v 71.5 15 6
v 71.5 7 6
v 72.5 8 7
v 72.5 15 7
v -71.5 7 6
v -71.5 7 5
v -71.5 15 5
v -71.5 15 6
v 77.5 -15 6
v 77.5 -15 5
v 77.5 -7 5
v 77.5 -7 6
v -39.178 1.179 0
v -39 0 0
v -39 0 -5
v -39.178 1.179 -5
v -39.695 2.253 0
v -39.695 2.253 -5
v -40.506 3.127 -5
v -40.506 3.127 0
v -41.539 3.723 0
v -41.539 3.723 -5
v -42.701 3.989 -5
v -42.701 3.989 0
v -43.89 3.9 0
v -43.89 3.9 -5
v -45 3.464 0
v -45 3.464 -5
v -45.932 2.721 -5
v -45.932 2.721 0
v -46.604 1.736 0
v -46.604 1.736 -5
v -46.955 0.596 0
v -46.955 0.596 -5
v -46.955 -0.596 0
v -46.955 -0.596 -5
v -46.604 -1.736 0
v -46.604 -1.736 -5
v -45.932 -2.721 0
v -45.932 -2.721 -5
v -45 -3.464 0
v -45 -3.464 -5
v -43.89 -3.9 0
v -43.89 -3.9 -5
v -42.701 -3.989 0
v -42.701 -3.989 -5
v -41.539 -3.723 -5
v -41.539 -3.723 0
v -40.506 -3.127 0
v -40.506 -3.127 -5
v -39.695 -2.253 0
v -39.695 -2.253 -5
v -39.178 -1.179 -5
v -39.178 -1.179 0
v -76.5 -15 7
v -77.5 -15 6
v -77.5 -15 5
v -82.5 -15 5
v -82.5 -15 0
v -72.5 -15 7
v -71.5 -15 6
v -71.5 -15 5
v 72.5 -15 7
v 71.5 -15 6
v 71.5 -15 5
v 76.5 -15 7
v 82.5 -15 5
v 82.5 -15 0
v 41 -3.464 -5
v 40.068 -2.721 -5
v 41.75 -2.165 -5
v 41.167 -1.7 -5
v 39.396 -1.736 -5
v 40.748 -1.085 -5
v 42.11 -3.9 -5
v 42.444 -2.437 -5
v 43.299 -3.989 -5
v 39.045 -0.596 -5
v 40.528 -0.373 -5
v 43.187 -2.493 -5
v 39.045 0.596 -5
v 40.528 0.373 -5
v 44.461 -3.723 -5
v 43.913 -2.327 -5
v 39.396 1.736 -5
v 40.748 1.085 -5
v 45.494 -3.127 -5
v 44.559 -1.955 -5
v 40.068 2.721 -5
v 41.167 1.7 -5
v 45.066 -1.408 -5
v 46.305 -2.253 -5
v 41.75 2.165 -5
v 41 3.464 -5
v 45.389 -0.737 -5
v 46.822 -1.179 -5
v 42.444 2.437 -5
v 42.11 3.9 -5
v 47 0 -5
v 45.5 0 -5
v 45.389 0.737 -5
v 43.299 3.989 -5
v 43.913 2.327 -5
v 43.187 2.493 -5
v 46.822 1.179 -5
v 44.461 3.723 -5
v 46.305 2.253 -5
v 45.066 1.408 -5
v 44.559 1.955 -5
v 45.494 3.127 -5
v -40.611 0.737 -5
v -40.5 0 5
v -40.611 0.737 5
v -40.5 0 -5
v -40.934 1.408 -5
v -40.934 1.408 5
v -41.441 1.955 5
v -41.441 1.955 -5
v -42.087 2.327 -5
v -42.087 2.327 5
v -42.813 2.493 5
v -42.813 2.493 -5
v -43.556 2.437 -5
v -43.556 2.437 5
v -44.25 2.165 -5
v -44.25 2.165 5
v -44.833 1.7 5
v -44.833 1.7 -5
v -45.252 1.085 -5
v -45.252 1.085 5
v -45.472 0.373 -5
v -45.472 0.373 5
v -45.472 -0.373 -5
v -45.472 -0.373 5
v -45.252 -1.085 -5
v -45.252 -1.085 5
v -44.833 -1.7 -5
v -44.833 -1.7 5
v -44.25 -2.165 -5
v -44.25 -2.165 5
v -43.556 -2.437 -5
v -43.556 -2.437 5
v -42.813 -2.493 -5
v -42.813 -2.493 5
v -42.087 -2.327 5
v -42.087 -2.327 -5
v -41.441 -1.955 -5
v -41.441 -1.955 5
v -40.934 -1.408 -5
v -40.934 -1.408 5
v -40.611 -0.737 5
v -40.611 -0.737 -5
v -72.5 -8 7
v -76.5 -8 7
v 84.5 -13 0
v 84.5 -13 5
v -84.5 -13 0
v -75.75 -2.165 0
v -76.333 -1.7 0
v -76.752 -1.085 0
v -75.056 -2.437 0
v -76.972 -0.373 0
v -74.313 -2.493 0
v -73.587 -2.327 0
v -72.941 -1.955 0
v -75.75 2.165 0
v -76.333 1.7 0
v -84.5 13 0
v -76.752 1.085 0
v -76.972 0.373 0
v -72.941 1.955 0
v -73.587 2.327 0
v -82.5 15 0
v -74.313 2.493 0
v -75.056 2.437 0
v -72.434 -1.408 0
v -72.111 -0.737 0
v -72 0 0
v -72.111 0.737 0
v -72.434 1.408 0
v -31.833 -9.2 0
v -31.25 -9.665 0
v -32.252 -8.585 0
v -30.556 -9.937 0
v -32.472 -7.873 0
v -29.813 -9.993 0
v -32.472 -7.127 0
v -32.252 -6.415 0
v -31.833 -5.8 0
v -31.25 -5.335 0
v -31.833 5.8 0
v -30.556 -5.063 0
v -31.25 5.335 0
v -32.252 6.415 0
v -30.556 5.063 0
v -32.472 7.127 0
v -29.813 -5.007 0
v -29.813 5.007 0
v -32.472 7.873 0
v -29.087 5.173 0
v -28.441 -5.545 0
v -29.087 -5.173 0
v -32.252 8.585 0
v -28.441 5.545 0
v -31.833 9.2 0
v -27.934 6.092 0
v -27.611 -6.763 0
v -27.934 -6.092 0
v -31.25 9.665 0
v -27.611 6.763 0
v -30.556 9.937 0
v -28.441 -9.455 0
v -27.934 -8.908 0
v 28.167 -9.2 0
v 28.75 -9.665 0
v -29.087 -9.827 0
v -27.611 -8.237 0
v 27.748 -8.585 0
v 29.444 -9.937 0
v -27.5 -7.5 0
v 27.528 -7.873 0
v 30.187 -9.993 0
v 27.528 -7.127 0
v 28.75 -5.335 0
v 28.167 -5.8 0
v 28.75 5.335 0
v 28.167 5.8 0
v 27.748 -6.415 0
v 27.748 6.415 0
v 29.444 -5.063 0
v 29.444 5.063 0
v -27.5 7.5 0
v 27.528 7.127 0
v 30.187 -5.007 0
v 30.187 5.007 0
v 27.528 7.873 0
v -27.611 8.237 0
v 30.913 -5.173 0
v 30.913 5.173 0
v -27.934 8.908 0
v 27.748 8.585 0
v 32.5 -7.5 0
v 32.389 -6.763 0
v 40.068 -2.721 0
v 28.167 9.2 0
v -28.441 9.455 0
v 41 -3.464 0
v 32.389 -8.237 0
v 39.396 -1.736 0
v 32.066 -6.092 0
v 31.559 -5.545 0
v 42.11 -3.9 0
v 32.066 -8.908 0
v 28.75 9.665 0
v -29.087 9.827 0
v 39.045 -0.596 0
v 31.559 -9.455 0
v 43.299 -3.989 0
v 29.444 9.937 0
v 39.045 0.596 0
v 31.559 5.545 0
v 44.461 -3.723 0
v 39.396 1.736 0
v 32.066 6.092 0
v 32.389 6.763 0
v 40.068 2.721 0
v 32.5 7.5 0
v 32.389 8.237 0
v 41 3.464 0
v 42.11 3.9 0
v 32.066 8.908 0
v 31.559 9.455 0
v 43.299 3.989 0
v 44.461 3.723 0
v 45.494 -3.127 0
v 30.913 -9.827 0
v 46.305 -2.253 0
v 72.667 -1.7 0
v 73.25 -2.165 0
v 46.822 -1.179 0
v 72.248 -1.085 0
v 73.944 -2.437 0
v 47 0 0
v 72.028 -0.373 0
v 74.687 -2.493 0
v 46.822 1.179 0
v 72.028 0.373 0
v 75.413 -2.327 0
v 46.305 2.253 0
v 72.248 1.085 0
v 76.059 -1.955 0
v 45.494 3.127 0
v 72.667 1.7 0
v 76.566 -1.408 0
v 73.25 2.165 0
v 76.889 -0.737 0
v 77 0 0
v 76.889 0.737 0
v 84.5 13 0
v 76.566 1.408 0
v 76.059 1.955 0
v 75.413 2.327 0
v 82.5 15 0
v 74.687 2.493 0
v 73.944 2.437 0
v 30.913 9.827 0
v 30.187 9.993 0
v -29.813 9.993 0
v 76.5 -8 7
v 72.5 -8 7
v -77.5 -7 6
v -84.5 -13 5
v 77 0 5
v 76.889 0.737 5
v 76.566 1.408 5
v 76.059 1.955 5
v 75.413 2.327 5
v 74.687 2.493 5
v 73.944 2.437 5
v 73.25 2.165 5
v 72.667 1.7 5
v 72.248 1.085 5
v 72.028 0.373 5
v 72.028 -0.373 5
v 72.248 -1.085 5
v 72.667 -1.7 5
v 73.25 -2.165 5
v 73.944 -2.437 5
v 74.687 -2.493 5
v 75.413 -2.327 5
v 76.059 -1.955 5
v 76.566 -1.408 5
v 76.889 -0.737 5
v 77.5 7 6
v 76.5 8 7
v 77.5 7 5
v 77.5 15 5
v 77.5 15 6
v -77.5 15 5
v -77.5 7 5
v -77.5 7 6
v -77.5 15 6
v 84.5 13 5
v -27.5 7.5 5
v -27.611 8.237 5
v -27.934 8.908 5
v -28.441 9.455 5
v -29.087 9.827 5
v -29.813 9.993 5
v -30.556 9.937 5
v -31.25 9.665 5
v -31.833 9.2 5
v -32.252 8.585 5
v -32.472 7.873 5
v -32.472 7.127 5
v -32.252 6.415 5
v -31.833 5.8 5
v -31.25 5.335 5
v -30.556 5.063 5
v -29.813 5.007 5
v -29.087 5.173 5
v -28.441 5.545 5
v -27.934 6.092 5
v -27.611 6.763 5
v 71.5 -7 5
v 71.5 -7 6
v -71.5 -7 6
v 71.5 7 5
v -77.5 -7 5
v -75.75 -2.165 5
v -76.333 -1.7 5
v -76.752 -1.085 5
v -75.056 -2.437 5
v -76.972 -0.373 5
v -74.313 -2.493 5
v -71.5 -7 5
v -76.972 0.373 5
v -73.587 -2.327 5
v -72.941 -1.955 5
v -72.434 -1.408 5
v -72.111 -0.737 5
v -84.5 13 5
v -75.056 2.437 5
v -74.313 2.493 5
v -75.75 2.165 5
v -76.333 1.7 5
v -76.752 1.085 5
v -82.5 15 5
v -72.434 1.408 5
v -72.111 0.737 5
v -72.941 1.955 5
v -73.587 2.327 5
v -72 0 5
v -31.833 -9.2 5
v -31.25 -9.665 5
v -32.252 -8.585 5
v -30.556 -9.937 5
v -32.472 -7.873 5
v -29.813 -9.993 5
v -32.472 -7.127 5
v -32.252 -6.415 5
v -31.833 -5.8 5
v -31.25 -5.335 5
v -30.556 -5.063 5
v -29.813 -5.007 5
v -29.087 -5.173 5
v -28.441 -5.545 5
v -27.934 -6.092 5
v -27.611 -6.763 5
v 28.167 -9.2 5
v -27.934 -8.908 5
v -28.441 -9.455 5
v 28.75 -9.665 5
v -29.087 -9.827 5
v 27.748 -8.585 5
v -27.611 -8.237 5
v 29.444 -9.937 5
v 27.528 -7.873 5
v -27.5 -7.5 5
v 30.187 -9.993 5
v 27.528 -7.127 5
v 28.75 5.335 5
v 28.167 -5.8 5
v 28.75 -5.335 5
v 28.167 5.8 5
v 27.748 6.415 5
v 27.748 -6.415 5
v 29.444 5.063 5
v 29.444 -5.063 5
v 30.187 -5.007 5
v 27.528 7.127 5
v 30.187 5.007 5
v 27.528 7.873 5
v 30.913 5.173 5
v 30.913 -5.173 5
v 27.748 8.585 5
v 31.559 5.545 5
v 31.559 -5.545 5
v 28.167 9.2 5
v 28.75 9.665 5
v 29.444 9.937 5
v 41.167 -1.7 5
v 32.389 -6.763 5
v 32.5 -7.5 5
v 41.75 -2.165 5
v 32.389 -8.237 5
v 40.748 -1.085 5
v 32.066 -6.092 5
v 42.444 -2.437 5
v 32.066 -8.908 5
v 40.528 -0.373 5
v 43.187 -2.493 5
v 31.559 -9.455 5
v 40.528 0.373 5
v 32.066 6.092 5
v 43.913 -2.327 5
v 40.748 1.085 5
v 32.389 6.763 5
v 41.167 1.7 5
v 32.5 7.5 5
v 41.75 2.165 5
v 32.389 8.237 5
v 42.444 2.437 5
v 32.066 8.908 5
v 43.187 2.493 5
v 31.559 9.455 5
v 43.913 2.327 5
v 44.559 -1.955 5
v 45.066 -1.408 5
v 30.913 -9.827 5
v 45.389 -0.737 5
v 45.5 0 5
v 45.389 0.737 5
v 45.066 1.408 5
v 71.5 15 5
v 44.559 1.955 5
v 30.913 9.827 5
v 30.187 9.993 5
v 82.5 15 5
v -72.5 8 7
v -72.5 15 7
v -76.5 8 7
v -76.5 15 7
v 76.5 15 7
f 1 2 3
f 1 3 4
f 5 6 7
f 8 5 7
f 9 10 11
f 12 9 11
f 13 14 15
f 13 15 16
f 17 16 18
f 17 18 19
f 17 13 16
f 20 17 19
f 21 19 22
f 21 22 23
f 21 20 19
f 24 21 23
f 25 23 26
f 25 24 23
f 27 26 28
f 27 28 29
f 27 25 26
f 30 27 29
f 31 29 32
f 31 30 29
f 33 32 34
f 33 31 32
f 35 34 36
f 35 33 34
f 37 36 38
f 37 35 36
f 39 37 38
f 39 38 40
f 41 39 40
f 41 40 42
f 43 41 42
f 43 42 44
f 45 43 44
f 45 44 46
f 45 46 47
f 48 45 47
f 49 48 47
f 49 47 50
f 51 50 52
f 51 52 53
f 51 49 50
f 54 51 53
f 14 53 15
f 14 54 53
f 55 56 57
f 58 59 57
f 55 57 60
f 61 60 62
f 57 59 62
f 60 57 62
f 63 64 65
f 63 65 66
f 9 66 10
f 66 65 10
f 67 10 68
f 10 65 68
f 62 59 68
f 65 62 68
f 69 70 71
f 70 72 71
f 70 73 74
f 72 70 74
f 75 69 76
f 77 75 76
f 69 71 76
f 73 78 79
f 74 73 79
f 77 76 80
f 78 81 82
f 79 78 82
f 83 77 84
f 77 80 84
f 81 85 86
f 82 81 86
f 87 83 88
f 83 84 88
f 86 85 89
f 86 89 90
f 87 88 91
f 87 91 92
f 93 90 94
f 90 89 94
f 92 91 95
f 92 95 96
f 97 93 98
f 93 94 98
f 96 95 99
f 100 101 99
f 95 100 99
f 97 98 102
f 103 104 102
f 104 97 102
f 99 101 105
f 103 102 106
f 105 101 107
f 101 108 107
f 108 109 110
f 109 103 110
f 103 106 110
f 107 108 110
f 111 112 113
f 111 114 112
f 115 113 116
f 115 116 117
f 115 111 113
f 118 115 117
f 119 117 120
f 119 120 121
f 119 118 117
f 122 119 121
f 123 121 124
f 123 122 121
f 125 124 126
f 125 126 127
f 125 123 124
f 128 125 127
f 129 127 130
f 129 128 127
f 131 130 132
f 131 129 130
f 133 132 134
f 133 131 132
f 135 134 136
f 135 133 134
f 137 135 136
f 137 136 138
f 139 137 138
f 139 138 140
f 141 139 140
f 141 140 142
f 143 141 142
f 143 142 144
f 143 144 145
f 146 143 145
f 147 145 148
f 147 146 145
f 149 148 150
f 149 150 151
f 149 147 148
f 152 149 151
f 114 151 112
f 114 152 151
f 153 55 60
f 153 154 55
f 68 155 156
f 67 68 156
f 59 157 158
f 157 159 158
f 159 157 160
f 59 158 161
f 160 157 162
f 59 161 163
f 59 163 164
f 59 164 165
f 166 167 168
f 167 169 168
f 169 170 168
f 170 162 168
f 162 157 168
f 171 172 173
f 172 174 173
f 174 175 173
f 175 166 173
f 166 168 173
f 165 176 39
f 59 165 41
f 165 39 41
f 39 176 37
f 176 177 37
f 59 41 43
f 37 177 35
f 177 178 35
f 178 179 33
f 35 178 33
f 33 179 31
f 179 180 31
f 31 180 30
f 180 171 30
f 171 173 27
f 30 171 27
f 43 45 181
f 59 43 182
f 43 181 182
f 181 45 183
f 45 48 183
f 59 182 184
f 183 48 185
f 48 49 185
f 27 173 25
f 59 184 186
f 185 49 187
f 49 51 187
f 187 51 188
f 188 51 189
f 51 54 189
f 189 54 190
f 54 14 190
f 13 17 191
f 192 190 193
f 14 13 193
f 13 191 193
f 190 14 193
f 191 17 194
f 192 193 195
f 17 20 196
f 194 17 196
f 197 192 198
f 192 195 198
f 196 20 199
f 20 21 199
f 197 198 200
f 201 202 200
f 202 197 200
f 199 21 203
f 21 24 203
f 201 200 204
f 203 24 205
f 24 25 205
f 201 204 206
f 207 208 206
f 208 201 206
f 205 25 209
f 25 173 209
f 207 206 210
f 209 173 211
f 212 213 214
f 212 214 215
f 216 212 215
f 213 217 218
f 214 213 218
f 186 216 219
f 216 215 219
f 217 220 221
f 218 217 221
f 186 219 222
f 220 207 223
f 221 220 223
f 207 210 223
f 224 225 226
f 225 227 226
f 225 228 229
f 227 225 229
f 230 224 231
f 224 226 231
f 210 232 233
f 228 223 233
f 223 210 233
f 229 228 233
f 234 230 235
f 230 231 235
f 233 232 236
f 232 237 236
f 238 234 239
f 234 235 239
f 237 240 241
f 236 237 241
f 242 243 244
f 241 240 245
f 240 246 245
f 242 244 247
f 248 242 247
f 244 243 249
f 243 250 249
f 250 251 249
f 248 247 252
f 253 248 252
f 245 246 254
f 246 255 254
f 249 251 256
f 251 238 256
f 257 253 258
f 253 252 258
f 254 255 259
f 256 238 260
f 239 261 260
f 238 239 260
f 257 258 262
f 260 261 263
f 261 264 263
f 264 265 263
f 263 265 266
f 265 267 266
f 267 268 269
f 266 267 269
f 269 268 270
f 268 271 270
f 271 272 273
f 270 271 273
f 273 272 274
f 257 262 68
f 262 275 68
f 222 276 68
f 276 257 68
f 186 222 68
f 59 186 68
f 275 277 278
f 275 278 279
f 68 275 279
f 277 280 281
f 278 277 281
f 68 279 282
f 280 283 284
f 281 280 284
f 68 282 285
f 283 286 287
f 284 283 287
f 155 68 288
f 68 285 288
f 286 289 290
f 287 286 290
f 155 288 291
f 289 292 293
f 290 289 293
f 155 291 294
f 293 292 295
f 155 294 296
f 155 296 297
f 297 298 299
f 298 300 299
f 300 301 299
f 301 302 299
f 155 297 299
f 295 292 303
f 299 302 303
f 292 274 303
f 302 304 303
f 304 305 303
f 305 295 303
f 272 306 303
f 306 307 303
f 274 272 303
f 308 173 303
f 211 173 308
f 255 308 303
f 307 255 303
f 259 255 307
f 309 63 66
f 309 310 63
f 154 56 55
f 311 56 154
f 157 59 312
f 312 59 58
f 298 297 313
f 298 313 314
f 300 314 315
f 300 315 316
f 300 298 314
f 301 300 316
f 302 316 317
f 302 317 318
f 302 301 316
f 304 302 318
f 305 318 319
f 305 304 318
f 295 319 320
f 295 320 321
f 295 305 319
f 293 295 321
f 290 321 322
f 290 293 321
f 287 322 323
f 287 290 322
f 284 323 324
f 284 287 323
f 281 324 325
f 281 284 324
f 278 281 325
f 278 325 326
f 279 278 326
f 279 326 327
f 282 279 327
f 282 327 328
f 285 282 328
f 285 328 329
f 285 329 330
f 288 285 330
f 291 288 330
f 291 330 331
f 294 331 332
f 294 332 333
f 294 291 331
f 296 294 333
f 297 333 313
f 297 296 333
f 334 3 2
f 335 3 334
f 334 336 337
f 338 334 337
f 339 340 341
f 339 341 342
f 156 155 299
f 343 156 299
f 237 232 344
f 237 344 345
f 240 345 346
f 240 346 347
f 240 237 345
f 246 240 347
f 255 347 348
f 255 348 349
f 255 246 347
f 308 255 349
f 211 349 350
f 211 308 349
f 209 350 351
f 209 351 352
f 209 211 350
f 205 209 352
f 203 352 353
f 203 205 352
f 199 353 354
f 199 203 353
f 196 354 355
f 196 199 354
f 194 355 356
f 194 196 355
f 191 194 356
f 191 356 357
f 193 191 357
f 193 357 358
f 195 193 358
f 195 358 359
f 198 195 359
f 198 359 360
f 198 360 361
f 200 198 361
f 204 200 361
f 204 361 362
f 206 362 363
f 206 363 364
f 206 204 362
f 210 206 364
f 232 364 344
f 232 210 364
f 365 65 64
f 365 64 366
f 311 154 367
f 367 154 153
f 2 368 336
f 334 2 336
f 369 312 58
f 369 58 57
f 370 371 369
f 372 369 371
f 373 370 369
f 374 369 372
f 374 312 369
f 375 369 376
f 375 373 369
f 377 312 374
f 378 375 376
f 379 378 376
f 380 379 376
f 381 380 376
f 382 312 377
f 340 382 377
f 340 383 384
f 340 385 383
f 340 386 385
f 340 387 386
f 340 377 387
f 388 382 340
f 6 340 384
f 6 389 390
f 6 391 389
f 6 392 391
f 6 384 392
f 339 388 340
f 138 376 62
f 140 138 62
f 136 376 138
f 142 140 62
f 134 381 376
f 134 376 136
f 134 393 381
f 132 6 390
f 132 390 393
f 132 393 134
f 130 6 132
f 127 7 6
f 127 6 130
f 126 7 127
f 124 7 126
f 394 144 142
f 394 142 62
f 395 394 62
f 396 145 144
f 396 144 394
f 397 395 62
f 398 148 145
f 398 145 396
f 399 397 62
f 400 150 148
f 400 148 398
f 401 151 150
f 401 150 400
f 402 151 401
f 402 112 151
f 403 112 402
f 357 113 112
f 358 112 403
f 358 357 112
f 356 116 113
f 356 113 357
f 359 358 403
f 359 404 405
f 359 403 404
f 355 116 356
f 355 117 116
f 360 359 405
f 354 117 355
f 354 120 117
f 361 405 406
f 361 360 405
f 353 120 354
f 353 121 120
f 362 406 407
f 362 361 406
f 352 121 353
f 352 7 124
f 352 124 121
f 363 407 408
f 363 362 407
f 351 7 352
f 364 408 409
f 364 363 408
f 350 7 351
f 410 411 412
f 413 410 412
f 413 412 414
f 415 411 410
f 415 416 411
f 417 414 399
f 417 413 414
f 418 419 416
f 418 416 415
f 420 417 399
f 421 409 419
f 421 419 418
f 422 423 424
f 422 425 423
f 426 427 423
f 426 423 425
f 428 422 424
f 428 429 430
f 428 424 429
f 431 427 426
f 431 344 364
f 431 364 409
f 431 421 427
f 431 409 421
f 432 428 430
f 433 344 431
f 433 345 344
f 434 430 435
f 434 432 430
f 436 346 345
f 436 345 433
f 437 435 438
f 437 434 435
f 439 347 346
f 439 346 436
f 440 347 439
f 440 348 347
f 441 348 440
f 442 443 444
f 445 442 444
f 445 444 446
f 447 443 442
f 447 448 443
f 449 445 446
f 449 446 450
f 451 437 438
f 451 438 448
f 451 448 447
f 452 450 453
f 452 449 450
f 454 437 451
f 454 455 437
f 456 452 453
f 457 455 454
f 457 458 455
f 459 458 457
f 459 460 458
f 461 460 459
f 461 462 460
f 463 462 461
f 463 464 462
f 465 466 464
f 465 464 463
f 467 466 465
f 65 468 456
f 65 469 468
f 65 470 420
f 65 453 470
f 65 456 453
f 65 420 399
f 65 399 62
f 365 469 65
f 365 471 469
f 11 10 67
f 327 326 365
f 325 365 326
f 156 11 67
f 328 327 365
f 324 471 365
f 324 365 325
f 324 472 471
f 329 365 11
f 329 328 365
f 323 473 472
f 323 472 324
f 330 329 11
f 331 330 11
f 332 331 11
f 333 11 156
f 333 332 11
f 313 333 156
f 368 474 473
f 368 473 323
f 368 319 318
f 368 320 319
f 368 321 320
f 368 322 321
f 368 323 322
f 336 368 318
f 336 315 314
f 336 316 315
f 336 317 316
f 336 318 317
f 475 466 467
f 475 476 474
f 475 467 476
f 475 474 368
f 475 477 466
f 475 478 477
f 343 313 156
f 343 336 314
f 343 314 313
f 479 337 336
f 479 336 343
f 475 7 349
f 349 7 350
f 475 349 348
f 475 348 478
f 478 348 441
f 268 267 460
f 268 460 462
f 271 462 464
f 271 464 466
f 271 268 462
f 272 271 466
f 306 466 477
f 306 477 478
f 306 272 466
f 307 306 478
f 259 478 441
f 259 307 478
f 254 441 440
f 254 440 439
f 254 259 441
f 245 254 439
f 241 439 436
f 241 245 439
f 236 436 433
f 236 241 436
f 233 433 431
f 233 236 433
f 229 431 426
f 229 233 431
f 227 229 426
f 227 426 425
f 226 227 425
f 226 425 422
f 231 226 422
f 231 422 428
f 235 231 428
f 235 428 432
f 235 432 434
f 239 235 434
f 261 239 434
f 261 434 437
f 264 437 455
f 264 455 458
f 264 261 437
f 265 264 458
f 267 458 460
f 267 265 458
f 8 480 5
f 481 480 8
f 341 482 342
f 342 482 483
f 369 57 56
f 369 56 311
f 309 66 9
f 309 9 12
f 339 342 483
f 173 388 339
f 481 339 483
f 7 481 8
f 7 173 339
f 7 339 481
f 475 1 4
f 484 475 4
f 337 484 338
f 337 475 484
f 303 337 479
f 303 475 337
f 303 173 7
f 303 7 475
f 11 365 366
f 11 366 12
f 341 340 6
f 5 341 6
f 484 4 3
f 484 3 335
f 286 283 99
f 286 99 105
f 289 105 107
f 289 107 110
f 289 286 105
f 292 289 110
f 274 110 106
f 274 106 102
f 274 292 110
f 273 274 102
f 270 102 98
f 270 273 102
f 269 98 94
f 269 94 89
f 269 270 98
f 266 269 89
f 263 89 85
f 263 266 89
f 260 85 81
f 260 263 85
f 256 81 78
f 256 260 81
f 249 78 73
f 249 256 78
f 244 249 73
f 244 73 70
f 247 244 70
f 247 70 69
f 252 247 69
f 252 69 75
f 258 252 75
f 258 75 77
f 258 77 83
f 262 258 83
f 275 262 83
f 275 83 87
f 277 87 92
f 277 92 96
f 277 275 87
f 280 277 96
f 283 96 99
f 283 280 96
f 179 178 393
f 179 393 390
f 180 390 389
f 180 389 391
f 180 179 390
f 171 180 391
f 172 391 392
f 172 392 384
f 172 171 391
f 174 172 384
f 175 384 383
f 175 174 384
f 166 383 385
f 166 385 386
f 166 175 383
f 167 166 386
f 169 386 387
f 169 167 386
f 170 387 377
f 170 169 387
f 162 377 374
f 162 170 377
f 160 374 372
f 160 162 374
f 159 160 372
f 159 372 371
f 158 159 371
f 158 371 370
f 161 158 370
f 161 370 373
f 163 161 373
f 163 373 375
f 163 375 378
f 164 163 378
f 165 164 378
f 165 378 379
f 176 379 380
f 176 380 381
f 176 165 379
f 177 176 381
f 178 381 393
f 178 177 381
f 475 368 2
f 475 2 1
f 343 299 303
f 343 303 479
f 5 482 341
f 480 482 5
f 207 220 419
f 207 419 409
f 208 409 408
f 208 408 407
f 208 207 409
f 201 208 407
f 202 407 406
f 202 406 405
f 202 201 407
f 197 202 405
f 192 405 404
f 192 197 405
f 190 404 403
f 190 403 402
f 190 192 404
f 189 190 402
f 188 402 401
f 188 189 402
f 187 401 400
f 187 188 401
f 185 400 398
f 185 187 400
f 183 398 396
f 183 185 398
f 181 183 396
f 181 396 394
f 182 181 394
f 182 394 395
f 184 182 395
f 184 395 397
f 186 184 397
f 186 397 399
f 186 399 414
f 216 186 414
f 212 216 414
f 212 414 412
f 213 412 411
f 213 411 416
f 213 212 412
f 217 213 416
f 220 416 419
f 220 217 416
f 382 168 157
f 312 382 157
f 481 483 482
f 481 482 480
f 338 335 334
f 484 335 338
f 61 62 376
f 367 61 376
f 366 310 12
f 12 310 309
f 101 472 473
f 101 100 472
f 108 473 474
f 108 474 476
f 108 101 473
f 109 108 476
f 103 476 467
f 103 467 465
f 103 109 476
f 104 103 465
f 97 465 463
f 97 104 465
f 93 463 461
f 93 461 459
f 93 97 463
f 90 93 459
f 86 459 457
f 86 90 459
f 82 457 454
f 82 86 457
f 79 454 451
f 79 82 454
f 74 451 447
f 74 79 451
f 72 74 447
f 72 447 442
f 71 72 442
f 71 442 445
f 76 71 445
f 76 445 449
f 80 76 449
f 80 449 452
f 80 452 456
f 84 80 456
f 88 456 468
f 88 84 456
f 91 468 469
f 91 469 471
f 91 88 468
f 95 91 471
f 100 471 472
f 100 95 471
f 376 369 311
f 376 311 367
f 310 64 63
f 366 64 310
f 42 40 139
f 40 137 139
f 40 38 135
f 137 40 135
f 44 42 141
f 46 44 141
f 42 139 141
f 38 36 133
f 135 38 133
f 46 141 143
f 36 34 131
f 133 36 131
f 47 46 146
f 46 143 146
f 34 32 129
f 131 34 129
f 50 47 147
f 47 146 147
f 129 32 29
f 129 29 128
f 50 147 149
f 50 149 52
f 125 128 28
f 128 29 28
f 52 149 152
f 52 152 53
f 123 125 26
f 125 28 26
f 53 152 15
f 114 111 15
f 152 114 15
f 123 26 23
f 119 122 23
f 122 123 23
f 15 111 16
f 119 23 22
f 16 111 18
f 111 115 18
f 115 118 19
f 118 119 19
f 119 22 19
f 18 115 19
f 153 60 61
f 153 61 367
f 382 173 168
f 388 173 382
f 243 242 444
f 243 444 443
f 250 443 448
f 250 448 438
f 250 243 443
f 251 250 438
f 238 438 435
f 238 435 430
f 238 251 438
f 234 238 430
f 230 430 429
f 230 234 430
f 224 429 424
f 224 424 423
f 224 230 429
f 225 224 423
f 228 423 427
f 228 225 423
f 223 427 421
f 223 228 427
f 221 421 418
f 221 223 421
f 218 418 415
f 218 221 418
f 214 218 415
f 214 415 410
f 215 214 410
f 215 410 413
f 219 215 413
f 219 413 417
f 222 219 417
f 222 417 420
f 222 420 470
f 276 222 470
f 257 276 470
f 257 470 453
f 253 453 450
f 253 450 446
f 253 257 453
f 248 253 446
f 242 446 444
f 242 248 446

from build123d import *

# Parameters (mm, degrees)
F0_R     = 2.5
F0_R_2   = 4
F1_DEPTH = 5
F0_W     = 6
F0_H     = 8
F2_DEPTH = 7
F3_SIZE  = 1
F4_DEPTH = 5
F5_SIZE  = 2


with BuildPart() as f1:
    # F0 (on Top) → F1 (new body)
    with BuildSketch(Plane.XY):
        Polygon((-77.5, 15), (-84.5, 15), (-84.5, -15), (-77.5, -15), (-77.5, -7), (-71.5, -7), (-71.5, -15), (71.5, -15), (71.5, -7), (77.5, -7), (77.5, -15), (84.5, -15), (84.5, 15), (77.5, 15), (77.5, 7), (71.5, 7), (71.5, 15), (-71.5, 15), (-71.5, 7), (-77.5, 7), align=None)
        with Locations((-30, -7.5)):
            Circle(F0_R, mode=Mode.SUBTRACT)
        with Locations((30, -7.5)):
            Circle(F0_R, mode=Mode.SUBTRACT)
        with Locations((-74.5, 0)):
            Circle(F0_R, mode=Mode.SUBTRACT)
        with Locations((-43, 0)):
            Circle(F0_R_2, mode=Mode.SUBTRACT)
        with Locations((-30, 7.5)):
            Circle(F0_R, mode=Mode.SUBTRACT)
        with Locations((43, 0)):
            Circle(F0_R_2, mode=Mode.SUBTRACT)
        with Locations((74.5, 0)):
            Circle(F0_R, mode=Mode.SUBTRACT)
        with Locations((30, 7.5)):
            Circle(F0_R, mode=Mode.SUBTRACT)
        with Locations((-43, 0)):
            Circle(F0_R_2)
        with Locations((-43, 0)):
            Circle(F0_R, mode=Mode.SUBTRACT)
        with Locations((43, 0)):
            Circle(F0_R_2)
        with Locations((43, 0)):
            Circle(F0_R, mode=Mode.SUBTRACT)
    extrude(amount=F1_DEPTH)

    # F0 (on Top) → F2 (join)
    with BuildSketch(Plane.XY):
        with Locations((-74.5, 11)):
            Rectangle(F0_W, F0_H)
        with Locations((-74.5, -11)):
            Rectangle(F0_W, F0_H)
        with Locations((74.5, -11)):
            Rectangle(F0_W, F0_H)
        with Locations((74.5, 11)):
            Rectangle(F0_W, F0_H)
    extrude(amount=F2_DEPTH)

    # F3
    f3_edges = [f1.edges().sort_by_distance(p)[0] for p in [
        (-77.5, 11, 7),
        (-71.5, 11, 7),
        (-74.5, 7, 7),
        (-74.5, -7, 7),
        (-71.5, -11, 7),
        (-77.5, -11, 7),
        (77.5, 11, 7),
        (74.5, 7, 7),
        (71.5, 11, 7),
        (74.5, -7, 7),
        (77.5, -11, 7),
        (71.5, -11, 7),
    ]]
    chamfer(f3_edges, length=F3_SIZE)

    # F0 (on Top) → F4 (join)
    with BuildSketch(Plane.XY):
        with Locations((43, 0)):
            Circle(F0_R_2)
        with Locations((43, 0)):
            Circle(F0_R, mode=Mode.SUBTRACT)
        with Locations((-43, 0)):
            Circle(F0_R_2)
        with Locations((-43, 0)):
            Circle(F0_R, mode=Mode.SUBTRACT)
    extrude(amount=-F4_DEPTH)

    # F5
    f5_edges = [f1.edges().sort_by_distance(p)[0] for p in [
        (-84.5, -15, 2.5),
        (-84.5, 15, 2.5),
        (84.5, -15, 2.5),
        (84.5, 15, 2.5),
    ]]
    chamfer(f5_edges, length=F5_SIZE)


solid = f1.part
